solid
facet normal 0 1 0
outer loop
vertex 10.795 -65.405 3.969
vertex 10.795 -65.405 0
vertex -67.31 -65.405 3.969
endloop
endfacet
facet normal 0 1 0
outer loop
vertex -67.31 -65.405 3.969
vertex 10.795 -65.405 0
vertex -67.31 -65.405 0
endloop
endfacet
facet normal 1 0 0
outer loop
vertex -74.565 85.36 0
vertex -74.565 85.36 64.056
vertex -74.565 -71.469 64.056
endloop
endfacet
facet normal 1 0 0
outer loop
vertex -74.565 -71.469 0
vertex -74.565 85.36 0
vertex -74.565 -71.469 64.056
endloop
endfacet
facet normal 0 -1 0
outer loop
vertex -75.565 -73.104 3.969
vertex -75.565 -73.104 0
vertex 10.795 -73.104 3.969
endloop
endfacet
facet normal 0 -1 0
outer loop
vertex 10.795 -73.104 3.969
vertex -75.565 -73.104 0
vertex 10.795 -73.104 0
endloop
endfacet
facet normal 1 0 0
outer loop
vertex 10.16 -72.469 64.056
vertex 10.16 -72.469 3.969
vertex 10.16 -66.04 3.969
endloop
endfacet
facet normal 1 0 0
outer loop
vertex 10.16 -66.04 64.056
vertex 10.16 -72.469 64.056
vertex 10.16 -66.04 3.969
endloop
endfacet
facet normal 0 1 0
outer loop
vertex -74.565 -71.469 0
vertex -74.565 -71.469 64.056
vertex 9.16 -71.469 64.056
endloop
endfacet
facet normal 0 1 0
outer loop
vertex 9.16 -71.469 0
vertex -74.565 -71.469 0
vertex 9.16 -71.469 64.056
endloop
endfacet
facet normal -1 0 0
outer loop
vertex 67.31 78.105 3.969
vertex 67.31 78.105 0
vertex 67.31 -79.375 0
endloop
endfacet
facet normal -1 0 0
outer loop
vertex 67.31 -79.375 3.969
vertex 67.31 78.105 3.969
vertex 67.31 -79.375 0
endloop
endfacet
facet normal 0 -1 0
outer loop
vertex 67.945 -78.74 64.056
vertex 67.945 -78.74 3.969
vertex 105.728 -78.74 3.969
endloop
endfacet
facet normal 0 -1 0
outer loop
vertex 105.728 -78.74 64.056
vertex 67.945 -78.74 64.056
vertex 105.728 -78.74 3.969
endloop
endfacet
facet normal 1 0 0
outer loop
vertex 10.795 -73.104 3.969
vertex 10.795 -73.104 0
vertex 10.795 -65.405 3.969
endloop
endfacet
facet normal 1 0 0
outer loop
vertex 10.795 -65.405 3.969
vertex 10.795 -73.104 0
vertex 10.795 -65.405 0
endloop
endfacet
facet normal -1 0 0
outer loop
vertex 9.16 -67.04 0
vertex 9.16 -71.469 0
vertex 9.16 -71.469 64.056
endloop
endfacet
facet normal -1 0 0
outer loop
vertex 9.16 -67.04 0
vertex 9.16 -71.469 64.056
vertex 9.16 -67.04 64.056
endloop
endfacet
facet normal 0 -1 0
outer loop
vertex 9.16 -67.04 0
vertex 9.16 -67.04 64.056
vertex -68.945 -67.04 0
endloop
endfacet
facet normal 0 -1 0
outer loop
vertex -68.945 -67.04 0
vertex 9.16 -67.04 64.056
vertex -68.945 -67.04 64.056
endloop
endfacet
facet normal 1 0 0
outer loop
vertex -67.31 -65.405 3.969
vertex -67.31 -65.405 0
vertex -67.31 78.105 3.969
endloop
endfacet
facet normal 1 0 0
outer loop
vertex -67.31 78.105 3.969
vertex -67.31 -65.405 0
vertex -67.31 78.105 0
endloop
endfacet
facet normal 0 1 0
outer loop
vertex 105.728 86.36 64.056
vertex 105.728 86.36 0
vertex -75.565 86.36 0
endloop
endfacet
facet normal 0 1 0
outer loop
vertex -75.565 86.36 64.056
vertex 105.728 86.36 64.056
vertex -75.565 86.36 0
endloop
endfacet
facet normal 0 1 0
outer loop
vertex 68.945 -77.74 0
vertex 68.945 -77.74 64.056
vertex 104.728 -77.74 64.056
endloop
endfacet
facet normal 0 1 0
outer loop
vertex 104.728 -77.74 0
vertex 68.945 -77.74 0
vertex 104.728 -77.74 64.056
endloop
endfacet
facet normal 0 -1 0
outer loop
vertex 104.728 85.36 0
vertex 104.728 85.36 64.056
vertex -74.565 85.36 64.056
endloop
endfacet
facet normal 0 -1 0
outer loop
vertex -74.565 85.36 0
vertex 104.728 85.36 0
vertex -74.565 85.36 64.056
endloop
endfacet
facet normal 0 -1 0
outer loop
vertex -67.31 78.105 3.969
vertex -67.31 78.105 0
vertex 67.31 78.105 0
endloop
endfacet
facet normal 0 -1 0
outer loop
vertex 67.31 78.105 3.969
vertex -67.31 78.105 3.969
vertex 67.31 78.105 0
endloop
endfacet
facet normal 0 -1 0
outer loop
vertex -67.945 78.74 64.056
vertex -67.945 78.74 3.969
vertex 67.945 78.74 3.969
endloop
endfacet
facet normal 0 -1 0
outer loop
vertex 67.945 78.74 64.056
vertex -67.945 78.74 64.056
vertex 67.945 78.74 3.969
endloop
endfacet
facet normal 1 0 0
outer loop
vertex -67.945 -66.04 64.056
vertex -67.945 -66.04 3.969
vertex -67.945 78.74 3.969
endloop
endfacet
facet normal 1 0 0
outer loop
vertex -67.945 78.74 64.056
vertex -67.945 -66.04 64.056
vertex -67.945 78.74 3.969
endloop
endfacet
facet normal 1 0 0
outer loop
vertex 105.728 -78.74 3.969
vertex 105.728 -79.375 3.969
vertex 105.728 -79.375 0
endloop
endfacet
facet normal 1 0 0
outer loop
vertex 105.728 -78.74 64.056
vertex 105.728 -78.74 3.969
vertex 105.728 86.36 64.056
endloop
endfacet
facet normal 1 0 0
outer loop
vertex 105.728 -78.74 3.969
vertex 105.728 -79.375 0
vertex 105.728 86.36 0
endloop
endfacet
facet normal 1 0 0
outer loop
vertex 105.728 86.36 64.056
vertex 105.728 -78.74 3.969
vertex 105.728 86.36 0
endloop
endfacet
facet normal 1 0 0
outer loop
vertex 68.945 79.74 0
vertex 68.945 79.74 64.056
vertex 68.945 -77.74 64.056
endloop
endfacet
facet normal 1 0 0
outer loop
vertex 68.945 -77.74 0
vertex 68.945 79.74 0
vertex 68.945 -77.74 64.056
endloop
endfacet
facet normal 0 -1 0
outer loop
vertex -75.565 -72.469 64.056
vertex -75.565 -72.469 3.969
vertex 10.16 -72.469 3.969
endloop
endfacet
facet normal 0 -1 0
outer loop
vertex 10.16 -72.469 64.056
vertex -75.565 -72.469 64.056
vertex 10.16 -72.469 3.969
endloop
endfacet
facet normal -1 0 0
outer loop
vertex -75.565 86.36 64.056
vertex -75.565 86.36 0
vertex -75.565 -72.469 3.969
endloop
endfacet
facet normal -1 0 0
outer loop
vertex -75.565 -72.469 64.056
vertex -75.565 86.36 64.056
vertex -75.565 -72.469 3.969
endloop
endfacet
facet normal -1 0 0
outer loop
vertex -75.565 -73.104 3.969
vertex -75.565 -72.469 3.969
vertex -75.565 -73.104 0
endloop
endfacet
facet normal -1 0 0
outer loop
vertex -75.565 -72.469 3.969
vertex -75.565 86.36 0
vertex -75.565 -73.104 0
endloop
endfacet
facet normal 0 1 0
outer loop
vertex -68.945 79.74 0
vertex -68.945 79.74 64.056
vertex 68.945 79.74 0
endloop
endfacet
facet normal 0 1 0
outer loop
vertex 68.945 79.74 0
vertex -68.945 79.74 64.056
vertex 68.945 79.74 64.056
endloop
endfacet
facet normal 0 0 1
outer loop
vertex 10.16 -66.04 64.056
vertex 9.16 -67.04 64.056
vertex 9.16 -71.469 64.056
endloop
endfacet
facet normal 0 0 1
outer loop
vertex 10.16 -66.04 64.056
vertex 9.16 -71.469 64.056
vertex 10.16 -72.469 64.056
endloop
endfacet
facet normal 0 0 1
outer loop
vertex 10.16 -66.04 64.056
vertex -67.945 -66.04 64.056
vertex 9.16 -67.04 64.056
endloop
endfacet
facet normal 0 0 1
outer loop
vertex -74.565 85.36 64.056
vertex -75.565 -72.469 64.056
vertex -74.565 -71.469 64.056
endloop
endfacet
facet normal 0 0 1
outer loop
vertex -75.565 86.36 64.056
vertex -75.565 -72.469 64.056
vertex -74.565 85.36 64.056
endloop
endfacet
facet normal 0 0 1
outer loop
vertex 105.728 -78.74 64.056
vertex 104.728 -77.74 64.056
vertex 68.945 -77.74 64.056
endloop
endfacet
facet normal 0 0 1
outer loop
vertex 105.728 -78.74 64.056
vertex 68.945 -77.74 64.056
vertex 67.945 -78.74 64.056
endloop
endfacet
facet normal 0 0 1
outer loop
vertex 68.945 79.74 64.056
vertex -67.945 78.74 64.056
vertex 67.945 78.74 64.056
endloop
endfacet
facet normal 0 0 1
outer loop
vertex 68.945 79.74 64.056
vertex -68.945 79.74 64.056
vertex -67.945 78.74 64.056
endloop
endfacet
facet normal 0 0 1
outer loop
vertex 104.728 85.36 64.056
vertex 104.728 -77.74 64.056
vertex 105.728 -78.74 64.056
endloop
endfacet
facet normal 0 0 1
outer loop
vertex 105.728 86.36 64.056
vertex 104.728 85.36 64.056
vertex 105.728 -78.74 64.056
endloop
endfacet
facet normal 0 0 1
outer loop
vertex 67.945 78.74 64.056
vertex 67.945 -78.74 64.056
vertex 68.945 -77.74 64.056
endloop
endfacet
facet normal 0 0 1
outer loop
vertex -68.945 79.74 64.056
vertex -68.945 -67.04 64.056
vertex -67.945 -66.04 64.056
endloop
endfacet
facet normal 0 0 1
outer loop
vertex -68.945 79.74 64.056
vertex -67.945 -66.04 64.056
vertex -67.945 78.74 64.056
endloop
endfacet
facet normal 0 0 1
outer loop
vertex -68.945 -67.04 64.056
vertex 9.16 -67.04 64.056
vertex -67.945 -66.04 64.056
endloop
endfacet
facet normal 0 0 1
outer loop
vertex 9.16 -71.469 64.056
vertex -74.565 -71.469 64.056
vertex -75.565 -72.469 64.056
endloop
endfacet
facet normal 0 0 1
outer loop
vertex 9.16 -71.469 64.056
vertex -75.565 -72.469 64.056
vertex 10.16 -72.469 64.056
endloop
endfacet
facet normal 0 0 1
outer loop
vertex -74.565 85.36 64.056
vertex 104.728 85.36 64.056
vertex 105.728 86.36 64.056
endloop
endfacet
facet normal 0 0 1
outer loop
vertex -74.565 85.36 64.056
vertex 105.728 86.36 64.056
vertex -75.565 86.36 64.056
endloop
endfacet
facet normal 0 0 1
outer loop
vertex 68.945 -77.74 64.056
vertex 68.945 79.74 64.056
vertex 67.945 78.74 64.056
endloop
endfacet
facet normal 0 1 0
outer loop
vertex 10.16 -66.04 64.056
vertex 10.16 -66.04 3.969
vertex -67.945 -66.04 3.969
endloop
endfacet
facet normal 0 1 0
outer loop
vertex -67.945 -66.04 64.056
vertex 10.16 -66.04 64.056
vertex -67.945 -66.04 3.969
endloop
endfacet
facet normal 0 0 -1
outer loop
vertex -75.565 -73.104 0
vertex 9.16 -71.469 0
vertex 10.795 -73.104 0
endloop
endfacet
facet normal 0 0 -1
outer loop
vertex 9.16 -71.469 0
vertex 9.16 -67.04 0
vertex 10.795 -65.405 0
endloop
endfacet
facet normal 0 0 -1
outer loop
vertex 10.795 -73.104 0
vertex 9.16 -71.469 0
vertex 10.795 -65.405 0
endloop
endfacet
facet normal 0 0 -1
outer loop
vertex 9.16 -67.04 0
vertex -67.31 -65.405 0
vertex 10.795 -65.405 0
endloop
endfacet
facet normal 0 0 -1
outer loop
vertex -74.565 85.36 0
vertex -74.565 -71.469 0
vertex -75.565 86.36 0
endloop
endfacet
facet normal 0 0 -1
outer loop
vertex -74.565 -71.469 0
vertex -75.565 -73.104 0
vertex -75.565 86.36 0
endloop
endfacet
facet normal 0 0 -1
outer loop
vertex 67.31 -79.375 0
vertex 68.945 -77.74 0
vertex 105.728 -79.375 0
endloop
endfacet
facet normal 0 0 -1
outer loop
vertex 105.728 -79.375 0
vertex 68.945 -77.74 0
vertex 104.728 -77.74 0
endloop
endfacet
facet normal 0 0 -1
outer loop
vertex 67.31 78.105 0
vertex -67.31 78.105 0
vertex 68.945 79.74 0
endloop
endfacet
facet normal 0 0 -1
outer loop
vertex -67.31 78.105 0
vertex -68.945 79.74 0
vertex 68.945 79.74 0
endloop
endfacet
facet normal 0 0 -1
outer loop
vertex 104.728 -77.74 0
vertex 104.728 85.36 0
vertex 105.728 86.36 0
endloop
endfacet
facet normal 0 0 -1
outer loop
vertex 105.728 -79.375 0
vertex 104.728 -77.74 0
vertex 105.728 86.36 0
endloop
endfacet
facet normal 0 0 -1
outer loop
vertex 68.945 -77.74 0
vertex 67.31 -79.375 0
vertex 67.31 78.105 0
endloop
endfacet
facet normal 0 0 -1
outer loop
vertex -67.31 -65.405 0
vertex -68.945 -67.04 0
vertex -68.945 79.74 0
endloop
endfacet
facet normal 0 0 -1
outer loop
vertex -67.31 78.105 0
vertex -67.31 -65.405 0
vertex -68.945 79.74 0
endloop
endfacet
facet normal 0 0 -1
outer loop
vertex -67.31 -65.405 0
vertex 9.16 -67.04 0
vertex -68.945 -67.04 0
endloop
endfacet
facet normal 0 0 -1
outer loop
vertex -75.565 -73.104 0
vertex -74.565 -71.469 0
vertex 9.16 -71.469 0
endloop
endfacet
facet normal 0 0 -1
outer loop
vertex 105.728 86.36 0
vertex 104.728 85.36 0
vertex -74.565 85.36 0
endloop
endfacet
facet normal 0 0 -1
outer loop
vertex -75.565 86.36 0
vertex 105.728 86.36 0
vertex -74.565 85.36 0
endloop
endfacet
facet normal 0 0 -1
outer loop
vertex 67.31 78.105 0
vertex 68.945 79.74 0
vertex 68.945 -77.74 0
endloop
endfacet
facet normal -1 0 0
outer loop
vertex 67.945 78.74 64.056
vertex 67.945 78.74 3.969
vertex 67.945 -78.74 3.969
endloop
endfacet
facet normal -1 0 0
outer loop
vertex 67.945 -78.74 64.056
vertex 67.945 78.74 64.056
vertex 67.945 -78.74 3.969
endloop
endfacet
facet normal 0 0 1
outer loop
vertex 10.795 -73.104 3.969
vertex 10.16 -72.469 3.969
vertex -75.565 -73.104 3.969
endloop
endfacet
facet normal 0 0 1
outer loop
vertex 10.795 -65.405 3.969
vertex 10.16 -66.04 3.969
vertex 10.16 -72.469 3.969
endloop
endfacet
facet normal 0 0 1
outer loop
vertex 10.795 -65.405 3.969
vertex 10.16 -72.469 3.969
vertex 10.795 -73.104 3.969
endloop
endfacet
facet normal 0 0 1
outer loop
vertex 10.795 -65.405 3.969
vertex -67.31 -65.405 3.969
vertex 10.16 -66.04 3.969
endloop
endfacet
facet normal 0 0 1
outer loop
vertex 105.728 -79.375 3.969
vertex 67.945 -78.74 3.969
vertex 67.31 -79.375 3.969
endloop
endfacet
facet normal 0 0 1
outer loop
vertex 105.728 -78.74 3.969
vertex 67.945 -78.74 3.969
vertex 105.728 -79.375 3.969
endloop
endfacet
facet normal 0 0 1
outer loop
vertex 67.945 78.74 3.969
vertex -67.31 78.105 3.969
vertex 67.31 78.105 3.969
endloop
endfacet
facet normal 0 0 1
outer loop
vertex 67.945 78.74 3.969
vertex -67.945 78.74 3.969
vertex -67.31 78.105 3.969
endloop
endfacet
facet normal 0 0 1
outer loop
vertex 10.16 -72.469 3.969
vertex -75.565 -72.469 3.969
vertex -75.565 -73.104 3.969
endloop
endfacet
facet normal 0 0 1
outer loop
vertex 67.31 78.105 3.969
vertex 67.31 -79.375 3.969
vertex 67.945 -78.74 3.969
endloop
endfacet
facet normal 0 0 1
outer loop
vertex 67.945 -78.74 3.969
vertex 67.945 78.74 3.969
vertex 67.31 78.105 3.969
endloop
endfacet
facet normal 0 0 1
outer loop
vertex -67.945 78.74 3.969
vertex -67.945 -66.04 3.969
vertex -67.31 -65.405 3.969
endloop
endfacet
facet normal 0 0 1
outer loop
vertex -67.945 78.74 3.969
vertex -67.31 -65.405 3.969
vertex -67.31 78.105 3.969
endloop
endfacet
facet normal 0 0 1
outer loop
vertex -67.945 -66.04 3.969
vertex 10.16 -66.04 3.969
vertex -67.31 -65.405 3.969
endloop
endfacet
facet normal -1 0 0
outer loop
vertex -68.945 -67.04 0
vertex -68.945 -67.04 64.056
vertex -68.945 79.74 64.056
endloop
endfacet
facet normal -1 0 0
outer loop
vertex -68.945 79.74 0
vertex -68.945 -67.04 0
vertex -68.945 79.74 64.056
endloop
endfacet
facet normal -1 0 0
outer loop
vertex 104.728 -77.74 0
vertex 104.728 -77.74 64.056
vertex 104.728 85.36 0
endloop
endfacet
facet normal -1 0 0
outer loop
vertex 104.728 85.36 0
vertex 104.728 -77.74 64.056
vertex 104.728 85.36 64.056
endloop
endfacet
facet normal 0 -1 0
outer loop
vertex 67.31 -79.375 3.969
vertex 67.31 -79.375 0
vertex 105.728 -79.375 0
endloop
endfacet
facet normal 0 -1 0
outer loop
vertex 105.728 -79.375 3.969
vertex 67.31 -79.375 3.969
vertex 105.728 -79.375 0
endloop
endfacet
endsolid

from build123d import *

# Parameters (mm, degrees)
F2_DEPTH = 0.6
F3_DEPTH = 1281.1125
F5_DEPTH = 79.375
F6_SCALE = 0.05
F8_DEPTH = 64.055625


with BuildPart() as f2:
    # F1 (on Top) → F2 (new body)
    with BuildSketch(Plane.XY):
        Polygon((-1358.9, -1320.8), (-1358.9, 1574.8), (1358.9, 1574.8), (1358.9, -1574.8), (2114.55, -1574.8), (2114.55, 1727.2), (-1511.3, 1727.2), (-1511.3, -1449.3875), (-1358.9, -1449.3875), (203.2, -1449.3875), (203.2, -1320.8), align=None)
    extrude(amount=F2_DEPTH)

    # F1 (on Top) → F3 (join)
    with BuildSketch(Plane.XY):
        Polygon((-1358.9, -1320.8), (-1358.9, 1574.8), (1358.9, 1574.8), (1358.9, -1574.8), (2114.55, -1574.8), (2114.55, 1727.2), (-1511.3, 1727.2), (-1511.3, -1449.3875), (-1358.9, -1449.3875), (203.2, -1449.3875), (203.2, -1320.8), align=None)
    extrude(amount=F3_DEPTH)

    # F4 (on Top) → F5 (join)
    with BuildSketch(Plane.XY):
        Polygon((203.2, -1320.8), (203.2, -1449.3875), (-1511.3, -1449.3875), (-1511.3, -1462.0875), (215.9, -1462.0875), (215.9, -1308.1), (-1346.2, -1308.1), (-1346.2, 1562.1), (1346.2, 1562.1), (1346.2, -1587.5), (2114.55, -1587.5), (2114.55, -1574.8), (1358.9, -1574.8), (1358.9, 1574.8), (-1358.9, 1574.8), (-1358.9, -1320.8), align=None)
    extrude(amount=F5_DEPTH)


with BuildPart() as f2_1:
    # F6: moved
    add(f2.part.scale(F6_SCALE))

    # F7 (on face) → F8 (cut, through all)
    with BuildSketch(Plane.XY.offset(64.055625)):
        Polygon((-68.945, -67.04), (-68.945, 79.74), (68.945, 79.74), (68.945, -77.74), (104.7275, -77.74), (104.7275, 85.36), (-74.565, 85.36), (-74.565, -71.469375), (9.16, -71.469375), (9.16, -67.04), align=None)
    extrude(amount=-F8_DEPTH, mode=Mode.SUBTRACT)


solid = f2_1.part
